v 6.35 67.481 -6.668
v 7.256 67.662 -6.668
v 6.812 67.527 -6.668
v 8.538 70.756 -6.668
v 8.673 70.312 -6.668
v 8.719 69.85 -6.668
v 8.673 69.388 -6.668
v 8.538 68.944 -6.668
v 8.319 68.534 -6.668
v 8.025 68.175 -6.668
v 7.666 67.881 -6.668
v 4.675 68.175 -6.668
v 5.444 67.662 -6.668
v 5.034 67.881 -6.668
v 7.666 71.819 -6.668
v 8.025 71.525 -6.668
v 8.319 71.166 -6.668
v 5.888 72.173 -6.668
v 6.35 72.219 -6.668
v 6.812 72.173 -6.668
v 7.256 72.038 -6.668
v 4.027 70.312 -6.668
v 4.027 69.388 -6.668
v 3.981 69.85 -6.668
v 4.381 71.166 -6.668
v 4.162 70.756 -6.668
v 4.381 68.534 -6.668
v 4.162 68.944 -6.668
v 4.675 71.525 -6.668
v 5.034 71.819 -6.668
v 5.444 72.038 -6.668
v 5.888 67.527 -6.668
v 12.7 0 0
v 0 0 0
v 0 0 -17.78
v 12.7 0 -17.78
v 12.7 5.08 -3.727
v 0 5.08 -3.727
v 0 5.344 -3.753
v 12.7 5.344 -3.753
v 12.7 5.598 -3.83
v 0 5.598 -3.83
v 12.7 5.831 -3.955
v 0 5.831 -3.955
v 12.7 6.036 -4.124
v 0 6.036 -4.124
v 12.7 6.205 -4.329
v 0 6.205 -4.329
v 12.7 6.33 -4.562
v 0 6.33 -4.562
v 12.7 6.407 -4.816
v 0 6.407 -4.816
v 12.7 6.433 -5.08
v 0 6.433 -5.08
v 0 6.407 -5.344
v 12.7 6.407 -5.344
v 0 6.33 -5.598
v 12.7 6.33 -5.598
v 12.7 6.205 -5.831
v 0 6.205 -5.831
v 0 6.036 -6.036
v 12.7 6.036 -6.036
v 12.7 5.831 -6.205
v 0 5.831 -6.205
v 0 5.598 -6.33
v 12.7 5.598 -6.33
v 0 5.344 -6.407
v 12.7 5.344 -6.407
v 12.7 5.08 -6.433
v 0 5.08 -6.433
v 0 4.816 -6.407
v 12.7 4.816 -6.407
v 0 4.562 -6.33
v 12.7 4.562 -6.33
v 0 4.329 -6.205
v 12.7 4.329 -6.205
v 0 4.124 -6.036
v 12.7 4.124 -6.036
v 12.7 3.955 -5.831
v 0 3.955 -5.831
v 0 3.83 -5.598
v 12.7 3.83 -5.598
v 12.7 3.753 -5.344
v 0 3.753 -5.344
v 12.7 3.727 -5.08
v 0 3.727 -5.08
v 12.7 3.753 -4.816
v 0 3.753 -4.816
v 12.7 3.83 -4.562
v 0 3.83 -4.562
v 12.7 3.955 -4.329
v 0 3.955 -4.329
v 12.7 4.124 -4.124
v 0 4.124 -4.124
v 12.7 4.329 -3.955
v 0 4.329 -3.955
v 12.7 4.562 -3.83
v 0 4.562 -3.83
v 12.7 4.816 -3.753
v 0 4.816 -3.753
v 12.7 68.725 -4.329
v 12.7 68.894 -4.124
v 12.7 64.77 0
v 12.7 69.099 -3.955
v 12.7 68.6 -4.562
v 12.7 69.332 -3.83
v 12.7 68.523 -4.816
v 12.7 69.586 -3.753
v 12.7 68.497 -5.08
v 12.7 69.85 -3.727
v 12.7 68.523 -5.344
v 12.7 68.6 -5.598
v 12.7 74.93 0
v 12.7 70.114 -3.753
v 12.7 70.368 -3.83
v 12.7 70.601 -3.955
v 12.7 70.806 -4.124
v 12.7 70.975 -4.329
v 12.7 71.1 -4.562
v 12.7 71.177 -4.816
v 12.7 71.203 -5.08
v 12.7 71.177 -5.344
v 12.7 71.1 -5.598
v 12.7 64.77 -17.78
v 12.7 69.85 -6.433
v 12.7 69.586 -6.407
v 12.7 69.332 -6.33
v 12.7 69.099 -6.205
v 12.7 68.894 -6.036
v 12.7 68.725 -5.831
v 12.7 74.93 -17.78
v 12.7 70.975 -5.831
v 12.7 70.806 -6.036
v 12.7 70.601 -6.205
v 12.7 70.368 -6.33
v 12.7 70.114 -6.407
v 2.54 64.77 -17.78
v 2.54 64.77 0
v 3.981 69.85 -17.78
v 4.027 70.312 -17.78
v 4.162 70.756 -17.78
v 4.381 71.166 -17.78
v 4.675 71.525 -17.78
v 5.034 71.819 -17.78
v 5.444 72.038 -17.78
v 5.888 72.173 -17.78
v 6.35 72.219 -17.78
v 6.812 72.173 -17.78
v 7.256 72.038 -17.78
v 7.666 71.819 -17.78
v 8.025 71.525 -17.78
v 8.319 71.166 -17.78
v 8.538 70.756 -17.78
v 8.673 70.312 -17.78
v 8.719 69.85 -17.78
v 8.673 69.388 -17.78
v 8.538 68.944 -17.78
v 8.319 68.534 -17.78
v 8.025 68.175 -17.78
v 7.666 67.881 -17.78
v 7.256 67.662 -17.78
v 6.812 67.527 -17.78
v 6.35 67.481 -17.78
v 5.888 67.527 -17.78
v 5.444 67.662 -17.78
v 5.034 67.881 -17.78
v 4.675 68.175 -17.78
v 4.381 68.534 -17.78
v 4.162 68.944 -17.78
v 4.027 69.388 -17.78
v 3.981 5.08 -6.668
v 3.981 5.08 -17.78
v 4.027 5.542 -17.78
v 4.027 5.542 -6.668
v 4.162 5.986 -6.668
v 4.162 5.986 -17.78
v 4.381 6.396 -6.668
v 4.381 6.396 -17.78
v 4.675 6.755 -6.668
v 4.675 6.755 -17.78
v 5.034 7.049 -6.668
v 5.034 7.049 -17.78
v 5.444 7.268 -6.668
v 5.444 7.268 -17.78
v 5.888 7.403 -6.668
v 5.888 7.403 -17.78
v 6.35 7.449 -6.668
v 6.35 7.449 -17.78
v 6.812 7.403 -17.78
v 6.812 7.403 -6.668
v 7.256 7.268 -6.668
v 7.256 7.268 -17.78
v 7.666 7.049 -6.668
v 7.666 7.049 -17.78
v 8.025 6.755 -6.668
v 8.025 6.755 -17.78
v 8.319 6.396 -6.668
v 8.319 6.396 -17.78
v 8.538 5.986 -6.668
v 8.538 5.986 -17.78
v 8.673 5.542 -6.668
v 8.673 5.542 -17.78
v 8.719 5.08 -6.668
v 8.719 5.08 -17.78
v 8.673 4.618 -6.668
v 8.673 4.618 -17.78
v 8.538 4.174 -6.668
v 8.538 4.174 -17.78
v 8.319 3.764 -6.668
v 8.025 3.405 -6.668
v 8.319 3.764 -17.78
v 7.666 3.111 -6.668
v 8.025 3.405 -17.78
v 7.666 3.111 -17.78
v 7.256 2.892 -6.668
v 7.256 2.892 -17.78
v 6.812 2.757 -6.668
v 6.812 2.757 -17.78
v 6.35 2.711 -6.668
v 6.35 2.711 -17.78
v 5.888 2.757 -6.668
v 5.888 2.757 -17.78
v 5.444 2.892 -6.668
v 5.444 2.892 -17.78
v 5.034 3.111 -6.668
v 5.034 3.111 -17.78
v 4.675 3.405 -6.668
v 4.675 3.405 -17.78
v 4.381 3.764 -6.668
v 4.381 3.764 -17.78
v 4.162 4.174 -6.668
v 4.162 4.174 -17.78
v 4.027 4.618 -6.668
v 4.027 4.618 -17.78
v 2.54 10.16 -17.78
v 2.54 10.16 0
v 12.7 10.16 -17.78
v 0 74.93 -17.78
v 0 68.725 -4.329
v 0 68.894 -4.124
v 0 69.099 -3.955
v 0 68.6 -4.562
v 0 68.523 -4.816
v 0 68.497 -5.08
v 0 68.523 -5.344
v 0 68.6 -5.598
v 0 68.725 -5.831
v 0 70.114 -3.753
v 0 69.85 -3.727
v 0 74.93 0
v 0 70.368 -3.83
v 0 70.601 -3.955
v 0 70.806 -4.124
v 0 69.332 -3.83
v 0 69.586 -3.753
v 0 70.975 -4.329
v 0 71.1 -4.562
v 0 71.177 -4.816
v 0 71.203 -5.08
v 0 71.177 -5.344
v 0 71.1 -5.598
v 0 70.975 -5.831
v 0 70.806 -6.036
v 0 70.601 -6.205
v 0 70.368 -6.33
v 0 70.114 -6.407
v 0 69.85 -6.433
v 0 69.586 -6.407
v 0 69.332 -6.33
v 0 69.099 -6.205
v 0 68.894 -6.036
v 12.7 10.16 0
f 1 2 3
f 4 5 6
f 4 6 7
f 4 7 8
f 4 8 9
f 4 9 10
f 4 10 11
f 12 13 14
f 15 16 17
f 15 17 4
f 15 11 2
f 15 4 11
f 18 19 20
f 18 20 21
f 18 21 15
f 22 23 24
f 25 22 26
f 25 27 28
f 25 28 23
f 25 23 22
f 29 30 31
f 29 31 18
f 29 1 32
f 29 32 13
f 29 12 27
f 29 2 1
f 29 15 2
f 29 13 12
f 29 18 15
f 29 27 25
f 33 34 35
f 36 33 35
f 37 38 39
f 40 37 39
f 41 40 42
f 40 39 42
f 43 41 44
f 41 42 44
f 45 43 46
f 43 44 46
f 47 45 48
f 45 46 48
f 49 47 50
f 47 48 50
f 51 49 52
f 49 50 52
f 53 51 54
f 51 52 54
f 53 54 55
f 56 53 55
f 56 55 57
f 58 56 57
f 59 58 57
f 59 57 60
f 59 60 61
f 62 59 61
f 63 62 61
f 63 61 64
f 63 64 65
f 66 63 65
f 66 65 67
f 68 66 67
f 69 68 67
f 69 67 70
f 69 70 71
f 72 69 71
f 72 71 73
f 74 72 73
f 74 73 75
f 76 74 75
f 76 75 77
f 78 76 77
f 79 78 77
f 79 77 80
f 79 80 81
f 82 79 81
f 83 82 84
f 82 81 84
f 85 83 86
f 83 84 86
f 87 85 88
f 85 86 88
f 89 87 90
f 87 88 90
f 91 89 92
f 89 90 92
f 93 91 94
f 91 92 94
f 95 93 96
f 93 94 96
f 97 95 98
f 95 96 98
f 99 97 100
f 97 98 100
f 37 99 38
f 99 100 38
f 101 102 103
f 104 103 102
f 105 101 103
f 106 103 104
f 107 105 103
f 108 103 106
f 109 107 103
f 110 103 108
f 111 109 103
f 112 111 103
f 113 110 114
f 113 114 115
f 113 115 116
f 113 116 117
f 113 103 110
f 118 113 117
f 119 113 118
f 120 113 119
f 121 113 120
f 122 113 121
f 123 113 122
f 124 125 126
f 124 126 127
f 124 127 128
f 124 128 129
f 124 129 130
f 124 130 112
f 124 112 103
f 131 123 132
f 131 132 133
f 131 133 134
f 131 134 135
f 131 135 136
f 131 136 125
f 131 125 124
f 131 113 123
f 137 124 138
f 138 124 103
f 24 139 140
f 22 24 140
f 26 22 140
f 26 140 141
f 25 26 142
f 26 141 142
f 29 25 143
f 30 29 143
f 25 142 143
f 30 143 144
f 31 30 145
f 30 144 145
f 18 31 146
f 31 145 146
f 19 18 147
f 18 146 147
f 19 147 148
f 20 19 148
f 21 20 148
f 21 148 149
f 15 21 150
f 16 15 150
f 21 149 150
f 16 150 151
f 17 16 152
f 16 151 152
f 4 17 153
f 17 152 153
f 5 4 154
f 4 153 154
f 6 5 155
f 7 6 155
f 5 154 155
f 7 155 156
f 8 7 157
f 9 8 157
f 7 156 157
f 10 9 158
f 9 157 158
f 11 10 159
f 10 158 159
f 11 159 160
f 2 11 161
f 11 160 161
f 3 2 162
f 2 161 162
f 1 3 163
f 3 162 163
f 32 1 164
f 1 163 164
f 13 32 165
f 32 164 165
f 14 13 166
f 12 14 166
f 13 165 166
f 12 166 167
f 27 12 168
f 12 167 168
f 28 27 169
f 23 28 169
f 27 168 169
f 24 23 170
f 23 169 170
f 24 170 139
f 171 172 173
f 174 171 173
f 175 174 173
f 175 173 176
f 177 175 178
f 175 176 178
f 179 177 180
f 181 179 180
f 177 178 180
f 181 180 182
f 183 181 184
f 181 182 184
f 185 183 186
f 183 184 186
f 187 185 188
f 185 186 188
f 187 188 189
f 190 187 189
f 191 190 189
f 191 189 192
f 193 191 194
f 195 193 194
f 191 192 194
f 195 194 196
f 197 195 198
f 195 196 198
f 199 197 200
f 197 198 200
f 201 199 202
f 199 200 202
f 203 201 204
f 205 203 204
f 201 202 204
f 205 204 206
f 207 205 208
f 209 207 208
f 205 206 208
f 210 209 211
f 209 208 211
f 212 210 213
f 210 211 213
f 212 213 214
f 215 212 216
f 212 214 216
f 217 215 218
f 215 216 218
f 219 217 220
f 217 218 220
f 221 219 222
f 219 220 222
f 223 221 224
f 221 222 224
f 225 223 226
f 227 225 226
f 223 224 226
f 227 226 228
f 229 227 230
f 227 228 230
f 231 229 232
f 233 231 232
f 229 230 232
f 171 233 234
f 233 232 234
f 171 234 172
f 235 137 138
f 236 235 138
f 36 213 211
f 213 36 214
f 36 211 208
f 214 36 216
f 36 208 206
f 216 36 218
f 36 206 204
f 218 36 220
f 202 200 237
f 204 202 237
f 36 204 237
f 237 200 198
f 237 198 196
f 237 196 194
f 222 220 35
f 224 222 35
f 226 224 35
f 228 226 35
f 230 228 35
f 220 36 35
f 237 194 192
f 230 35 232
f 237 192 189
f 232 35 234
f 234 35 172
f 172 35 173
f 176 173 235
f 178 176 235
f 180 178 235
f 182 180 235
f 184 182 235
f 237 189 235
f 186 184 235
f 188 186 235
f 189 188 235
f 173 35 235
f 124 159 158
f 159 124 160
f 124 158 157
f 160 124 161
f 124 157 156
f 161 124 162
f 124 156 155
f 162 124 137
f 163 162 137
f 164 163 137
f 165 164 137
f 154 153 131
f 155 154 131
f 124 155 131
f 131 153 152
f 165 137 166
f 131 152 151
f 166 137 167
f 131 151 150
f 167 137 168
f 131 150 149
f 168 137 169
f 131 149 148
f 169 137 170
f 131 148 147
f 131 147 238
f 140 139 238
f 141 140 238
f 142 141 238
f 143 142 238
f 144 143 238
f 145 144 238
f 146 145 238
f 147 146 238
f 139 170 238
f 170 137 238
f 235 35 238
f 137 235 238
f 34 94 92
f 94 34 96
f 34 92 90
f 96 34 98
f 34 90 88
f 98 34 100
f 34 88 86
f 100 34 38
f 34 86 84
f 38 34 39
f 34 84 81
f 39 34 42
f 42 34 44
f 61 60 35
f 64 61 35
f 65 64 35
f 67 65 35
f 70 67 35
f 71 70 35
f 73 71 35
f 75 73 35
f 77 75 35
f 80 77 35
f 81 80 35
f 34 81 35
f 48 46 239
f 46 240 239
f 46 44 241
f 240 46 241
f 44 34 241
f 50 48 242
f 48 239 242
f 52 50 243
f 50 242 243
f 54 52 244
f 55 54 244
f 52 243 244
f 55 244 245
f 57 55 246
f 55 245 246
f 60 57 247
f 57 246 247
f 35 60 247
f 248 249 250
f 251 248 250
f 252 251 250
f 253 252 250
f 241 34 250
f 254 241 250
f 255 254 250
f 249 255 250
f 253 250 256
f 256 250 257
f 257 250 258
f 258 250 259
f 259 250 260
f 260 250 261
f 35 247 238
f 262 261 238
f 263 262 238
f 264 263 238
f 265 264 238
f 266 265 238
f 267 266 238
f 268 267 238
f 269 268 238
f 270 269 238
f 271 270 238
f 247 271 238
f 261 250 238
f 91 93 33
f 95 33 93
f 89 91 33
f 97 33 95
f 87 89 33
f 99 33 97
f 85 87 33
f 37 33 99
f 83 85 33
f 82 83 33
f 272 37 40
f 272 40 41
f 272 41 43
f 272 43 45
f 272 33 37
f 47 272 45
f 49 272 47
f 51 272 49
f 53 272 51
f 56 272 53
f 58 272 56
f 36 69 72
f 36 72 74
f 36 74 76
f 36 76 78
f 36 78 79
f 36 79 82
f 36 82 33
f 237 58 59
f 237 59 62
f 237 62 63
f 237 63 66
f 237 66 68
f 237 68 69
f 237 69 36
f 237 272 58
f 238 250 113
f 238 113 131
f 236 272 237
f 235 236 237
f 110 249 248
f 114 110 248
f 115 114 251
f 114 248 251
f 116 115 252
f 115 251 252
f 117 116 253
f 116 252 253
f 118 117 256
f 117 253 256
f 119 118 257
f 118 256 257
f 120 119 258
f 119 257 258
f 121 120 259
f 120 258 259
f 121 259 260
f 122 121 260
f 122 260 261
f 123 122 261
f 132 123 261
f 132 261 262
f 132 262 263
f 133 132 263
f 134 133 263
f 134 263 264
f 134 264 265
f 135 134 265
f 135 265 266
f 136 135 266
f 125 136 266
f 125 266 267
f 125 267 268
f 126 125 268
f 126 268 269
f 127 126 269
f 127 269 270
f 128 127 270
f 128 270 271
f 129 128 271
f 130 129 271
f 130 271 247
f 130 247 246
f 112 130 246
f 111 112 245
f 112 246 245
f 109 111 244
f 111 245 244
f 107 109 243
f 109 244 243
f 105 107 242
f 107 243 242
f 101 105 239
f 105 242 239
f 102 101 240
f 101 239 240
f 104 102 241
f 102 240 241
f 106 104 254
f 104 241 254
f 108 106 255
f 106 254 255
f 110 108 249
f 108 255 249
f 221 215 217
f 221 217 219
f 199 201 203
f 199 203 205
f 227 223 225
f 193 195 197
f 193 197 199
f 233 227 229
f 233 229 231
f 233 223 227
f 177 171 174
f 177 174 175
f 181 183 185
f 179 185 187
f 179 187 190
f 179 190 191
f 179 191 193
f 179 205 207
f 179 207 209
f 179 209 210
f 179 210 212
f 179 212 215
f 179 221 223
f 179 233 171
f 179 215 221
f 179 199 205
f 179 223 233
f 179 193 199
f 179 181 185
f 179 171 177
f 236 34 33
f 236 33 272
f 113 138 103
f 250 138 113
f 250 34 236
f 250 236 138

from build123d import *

# Parameters (mm, degrees)
SKETCH1_W                 = 17.78
SKETCH1_H                 = 74.93
BOSS_EXTRUDE1_DEPTH       = 12.7
CUT_EXTRUDE1_DEPTH        = 10.16
TAP_DRILL_FOR_6_32_TAP1_D = 2.7051
SKETCH5_R                 = 2.36855
CUT_EXTRUDE2_DEPTH        = 11.1125


with BuildPart() as part:
    # Sketch1 → Boss-Extrude1 (new body)
    with BuildSketch(Plane(origin=(0, 0, 0), x_dir=(0, 0, -1), z_dir=(1, 0, 0))):
        with Locations((8.89, 37.465)):
            Rectangle(SKETCH1_W, SKETCH1_H)
    extrude(amount=BOSS_EXTRUDE1_DEPTH)

    # Sketch2 → Cut-Extrude1 (cut)
    with BuildSketch(Plane(origin=(12.7, 0, 0), x_dir=(0, 0, -1), z_dir=(1, 0, 0))):
        Polygon((0, 64.77), (10.16, 64.77), (13.97, 64.77), (24.13, 64.77), (24.13, 10.16), (13.97, 10.16), (10.16, 10.16), (0, 10.16), align=None)
    extrude(amount=-CUT_EXTRUDE1_DEPTH, mode=Mode.SUBTRACT)

    # Tap Drill for #6-32 Tap1 (through all)
    with Locations(Plane(origin=(12.7, 0, 0), x_dir=(0, 0, -1), z_dir=(1, 0, 0))):
        with Locations((5.08, 69.85), (5.08, 5.08)):
            Hole(TAP_DRILL_FOR_6_32_TAP1_D / 2)

    # Sketch5 → Cut-Extrude2 (cut)
    with BuildSketch(Plane(origin=(0, 0, -17.78), x_dir=(-1, 0, 0), z_dir=(0, 0, -1))):
        with Locations((-6.35, 69.85)):
            Circle(SKETCH5_R)
        with Locations((-6.35, 5.08)):
            Circle(SKETCH5_R)
    extrude(amount=-CUT_EXTRUDE2_DEPTH, mode=Mode.SUBTRACT)


solid = part.part
